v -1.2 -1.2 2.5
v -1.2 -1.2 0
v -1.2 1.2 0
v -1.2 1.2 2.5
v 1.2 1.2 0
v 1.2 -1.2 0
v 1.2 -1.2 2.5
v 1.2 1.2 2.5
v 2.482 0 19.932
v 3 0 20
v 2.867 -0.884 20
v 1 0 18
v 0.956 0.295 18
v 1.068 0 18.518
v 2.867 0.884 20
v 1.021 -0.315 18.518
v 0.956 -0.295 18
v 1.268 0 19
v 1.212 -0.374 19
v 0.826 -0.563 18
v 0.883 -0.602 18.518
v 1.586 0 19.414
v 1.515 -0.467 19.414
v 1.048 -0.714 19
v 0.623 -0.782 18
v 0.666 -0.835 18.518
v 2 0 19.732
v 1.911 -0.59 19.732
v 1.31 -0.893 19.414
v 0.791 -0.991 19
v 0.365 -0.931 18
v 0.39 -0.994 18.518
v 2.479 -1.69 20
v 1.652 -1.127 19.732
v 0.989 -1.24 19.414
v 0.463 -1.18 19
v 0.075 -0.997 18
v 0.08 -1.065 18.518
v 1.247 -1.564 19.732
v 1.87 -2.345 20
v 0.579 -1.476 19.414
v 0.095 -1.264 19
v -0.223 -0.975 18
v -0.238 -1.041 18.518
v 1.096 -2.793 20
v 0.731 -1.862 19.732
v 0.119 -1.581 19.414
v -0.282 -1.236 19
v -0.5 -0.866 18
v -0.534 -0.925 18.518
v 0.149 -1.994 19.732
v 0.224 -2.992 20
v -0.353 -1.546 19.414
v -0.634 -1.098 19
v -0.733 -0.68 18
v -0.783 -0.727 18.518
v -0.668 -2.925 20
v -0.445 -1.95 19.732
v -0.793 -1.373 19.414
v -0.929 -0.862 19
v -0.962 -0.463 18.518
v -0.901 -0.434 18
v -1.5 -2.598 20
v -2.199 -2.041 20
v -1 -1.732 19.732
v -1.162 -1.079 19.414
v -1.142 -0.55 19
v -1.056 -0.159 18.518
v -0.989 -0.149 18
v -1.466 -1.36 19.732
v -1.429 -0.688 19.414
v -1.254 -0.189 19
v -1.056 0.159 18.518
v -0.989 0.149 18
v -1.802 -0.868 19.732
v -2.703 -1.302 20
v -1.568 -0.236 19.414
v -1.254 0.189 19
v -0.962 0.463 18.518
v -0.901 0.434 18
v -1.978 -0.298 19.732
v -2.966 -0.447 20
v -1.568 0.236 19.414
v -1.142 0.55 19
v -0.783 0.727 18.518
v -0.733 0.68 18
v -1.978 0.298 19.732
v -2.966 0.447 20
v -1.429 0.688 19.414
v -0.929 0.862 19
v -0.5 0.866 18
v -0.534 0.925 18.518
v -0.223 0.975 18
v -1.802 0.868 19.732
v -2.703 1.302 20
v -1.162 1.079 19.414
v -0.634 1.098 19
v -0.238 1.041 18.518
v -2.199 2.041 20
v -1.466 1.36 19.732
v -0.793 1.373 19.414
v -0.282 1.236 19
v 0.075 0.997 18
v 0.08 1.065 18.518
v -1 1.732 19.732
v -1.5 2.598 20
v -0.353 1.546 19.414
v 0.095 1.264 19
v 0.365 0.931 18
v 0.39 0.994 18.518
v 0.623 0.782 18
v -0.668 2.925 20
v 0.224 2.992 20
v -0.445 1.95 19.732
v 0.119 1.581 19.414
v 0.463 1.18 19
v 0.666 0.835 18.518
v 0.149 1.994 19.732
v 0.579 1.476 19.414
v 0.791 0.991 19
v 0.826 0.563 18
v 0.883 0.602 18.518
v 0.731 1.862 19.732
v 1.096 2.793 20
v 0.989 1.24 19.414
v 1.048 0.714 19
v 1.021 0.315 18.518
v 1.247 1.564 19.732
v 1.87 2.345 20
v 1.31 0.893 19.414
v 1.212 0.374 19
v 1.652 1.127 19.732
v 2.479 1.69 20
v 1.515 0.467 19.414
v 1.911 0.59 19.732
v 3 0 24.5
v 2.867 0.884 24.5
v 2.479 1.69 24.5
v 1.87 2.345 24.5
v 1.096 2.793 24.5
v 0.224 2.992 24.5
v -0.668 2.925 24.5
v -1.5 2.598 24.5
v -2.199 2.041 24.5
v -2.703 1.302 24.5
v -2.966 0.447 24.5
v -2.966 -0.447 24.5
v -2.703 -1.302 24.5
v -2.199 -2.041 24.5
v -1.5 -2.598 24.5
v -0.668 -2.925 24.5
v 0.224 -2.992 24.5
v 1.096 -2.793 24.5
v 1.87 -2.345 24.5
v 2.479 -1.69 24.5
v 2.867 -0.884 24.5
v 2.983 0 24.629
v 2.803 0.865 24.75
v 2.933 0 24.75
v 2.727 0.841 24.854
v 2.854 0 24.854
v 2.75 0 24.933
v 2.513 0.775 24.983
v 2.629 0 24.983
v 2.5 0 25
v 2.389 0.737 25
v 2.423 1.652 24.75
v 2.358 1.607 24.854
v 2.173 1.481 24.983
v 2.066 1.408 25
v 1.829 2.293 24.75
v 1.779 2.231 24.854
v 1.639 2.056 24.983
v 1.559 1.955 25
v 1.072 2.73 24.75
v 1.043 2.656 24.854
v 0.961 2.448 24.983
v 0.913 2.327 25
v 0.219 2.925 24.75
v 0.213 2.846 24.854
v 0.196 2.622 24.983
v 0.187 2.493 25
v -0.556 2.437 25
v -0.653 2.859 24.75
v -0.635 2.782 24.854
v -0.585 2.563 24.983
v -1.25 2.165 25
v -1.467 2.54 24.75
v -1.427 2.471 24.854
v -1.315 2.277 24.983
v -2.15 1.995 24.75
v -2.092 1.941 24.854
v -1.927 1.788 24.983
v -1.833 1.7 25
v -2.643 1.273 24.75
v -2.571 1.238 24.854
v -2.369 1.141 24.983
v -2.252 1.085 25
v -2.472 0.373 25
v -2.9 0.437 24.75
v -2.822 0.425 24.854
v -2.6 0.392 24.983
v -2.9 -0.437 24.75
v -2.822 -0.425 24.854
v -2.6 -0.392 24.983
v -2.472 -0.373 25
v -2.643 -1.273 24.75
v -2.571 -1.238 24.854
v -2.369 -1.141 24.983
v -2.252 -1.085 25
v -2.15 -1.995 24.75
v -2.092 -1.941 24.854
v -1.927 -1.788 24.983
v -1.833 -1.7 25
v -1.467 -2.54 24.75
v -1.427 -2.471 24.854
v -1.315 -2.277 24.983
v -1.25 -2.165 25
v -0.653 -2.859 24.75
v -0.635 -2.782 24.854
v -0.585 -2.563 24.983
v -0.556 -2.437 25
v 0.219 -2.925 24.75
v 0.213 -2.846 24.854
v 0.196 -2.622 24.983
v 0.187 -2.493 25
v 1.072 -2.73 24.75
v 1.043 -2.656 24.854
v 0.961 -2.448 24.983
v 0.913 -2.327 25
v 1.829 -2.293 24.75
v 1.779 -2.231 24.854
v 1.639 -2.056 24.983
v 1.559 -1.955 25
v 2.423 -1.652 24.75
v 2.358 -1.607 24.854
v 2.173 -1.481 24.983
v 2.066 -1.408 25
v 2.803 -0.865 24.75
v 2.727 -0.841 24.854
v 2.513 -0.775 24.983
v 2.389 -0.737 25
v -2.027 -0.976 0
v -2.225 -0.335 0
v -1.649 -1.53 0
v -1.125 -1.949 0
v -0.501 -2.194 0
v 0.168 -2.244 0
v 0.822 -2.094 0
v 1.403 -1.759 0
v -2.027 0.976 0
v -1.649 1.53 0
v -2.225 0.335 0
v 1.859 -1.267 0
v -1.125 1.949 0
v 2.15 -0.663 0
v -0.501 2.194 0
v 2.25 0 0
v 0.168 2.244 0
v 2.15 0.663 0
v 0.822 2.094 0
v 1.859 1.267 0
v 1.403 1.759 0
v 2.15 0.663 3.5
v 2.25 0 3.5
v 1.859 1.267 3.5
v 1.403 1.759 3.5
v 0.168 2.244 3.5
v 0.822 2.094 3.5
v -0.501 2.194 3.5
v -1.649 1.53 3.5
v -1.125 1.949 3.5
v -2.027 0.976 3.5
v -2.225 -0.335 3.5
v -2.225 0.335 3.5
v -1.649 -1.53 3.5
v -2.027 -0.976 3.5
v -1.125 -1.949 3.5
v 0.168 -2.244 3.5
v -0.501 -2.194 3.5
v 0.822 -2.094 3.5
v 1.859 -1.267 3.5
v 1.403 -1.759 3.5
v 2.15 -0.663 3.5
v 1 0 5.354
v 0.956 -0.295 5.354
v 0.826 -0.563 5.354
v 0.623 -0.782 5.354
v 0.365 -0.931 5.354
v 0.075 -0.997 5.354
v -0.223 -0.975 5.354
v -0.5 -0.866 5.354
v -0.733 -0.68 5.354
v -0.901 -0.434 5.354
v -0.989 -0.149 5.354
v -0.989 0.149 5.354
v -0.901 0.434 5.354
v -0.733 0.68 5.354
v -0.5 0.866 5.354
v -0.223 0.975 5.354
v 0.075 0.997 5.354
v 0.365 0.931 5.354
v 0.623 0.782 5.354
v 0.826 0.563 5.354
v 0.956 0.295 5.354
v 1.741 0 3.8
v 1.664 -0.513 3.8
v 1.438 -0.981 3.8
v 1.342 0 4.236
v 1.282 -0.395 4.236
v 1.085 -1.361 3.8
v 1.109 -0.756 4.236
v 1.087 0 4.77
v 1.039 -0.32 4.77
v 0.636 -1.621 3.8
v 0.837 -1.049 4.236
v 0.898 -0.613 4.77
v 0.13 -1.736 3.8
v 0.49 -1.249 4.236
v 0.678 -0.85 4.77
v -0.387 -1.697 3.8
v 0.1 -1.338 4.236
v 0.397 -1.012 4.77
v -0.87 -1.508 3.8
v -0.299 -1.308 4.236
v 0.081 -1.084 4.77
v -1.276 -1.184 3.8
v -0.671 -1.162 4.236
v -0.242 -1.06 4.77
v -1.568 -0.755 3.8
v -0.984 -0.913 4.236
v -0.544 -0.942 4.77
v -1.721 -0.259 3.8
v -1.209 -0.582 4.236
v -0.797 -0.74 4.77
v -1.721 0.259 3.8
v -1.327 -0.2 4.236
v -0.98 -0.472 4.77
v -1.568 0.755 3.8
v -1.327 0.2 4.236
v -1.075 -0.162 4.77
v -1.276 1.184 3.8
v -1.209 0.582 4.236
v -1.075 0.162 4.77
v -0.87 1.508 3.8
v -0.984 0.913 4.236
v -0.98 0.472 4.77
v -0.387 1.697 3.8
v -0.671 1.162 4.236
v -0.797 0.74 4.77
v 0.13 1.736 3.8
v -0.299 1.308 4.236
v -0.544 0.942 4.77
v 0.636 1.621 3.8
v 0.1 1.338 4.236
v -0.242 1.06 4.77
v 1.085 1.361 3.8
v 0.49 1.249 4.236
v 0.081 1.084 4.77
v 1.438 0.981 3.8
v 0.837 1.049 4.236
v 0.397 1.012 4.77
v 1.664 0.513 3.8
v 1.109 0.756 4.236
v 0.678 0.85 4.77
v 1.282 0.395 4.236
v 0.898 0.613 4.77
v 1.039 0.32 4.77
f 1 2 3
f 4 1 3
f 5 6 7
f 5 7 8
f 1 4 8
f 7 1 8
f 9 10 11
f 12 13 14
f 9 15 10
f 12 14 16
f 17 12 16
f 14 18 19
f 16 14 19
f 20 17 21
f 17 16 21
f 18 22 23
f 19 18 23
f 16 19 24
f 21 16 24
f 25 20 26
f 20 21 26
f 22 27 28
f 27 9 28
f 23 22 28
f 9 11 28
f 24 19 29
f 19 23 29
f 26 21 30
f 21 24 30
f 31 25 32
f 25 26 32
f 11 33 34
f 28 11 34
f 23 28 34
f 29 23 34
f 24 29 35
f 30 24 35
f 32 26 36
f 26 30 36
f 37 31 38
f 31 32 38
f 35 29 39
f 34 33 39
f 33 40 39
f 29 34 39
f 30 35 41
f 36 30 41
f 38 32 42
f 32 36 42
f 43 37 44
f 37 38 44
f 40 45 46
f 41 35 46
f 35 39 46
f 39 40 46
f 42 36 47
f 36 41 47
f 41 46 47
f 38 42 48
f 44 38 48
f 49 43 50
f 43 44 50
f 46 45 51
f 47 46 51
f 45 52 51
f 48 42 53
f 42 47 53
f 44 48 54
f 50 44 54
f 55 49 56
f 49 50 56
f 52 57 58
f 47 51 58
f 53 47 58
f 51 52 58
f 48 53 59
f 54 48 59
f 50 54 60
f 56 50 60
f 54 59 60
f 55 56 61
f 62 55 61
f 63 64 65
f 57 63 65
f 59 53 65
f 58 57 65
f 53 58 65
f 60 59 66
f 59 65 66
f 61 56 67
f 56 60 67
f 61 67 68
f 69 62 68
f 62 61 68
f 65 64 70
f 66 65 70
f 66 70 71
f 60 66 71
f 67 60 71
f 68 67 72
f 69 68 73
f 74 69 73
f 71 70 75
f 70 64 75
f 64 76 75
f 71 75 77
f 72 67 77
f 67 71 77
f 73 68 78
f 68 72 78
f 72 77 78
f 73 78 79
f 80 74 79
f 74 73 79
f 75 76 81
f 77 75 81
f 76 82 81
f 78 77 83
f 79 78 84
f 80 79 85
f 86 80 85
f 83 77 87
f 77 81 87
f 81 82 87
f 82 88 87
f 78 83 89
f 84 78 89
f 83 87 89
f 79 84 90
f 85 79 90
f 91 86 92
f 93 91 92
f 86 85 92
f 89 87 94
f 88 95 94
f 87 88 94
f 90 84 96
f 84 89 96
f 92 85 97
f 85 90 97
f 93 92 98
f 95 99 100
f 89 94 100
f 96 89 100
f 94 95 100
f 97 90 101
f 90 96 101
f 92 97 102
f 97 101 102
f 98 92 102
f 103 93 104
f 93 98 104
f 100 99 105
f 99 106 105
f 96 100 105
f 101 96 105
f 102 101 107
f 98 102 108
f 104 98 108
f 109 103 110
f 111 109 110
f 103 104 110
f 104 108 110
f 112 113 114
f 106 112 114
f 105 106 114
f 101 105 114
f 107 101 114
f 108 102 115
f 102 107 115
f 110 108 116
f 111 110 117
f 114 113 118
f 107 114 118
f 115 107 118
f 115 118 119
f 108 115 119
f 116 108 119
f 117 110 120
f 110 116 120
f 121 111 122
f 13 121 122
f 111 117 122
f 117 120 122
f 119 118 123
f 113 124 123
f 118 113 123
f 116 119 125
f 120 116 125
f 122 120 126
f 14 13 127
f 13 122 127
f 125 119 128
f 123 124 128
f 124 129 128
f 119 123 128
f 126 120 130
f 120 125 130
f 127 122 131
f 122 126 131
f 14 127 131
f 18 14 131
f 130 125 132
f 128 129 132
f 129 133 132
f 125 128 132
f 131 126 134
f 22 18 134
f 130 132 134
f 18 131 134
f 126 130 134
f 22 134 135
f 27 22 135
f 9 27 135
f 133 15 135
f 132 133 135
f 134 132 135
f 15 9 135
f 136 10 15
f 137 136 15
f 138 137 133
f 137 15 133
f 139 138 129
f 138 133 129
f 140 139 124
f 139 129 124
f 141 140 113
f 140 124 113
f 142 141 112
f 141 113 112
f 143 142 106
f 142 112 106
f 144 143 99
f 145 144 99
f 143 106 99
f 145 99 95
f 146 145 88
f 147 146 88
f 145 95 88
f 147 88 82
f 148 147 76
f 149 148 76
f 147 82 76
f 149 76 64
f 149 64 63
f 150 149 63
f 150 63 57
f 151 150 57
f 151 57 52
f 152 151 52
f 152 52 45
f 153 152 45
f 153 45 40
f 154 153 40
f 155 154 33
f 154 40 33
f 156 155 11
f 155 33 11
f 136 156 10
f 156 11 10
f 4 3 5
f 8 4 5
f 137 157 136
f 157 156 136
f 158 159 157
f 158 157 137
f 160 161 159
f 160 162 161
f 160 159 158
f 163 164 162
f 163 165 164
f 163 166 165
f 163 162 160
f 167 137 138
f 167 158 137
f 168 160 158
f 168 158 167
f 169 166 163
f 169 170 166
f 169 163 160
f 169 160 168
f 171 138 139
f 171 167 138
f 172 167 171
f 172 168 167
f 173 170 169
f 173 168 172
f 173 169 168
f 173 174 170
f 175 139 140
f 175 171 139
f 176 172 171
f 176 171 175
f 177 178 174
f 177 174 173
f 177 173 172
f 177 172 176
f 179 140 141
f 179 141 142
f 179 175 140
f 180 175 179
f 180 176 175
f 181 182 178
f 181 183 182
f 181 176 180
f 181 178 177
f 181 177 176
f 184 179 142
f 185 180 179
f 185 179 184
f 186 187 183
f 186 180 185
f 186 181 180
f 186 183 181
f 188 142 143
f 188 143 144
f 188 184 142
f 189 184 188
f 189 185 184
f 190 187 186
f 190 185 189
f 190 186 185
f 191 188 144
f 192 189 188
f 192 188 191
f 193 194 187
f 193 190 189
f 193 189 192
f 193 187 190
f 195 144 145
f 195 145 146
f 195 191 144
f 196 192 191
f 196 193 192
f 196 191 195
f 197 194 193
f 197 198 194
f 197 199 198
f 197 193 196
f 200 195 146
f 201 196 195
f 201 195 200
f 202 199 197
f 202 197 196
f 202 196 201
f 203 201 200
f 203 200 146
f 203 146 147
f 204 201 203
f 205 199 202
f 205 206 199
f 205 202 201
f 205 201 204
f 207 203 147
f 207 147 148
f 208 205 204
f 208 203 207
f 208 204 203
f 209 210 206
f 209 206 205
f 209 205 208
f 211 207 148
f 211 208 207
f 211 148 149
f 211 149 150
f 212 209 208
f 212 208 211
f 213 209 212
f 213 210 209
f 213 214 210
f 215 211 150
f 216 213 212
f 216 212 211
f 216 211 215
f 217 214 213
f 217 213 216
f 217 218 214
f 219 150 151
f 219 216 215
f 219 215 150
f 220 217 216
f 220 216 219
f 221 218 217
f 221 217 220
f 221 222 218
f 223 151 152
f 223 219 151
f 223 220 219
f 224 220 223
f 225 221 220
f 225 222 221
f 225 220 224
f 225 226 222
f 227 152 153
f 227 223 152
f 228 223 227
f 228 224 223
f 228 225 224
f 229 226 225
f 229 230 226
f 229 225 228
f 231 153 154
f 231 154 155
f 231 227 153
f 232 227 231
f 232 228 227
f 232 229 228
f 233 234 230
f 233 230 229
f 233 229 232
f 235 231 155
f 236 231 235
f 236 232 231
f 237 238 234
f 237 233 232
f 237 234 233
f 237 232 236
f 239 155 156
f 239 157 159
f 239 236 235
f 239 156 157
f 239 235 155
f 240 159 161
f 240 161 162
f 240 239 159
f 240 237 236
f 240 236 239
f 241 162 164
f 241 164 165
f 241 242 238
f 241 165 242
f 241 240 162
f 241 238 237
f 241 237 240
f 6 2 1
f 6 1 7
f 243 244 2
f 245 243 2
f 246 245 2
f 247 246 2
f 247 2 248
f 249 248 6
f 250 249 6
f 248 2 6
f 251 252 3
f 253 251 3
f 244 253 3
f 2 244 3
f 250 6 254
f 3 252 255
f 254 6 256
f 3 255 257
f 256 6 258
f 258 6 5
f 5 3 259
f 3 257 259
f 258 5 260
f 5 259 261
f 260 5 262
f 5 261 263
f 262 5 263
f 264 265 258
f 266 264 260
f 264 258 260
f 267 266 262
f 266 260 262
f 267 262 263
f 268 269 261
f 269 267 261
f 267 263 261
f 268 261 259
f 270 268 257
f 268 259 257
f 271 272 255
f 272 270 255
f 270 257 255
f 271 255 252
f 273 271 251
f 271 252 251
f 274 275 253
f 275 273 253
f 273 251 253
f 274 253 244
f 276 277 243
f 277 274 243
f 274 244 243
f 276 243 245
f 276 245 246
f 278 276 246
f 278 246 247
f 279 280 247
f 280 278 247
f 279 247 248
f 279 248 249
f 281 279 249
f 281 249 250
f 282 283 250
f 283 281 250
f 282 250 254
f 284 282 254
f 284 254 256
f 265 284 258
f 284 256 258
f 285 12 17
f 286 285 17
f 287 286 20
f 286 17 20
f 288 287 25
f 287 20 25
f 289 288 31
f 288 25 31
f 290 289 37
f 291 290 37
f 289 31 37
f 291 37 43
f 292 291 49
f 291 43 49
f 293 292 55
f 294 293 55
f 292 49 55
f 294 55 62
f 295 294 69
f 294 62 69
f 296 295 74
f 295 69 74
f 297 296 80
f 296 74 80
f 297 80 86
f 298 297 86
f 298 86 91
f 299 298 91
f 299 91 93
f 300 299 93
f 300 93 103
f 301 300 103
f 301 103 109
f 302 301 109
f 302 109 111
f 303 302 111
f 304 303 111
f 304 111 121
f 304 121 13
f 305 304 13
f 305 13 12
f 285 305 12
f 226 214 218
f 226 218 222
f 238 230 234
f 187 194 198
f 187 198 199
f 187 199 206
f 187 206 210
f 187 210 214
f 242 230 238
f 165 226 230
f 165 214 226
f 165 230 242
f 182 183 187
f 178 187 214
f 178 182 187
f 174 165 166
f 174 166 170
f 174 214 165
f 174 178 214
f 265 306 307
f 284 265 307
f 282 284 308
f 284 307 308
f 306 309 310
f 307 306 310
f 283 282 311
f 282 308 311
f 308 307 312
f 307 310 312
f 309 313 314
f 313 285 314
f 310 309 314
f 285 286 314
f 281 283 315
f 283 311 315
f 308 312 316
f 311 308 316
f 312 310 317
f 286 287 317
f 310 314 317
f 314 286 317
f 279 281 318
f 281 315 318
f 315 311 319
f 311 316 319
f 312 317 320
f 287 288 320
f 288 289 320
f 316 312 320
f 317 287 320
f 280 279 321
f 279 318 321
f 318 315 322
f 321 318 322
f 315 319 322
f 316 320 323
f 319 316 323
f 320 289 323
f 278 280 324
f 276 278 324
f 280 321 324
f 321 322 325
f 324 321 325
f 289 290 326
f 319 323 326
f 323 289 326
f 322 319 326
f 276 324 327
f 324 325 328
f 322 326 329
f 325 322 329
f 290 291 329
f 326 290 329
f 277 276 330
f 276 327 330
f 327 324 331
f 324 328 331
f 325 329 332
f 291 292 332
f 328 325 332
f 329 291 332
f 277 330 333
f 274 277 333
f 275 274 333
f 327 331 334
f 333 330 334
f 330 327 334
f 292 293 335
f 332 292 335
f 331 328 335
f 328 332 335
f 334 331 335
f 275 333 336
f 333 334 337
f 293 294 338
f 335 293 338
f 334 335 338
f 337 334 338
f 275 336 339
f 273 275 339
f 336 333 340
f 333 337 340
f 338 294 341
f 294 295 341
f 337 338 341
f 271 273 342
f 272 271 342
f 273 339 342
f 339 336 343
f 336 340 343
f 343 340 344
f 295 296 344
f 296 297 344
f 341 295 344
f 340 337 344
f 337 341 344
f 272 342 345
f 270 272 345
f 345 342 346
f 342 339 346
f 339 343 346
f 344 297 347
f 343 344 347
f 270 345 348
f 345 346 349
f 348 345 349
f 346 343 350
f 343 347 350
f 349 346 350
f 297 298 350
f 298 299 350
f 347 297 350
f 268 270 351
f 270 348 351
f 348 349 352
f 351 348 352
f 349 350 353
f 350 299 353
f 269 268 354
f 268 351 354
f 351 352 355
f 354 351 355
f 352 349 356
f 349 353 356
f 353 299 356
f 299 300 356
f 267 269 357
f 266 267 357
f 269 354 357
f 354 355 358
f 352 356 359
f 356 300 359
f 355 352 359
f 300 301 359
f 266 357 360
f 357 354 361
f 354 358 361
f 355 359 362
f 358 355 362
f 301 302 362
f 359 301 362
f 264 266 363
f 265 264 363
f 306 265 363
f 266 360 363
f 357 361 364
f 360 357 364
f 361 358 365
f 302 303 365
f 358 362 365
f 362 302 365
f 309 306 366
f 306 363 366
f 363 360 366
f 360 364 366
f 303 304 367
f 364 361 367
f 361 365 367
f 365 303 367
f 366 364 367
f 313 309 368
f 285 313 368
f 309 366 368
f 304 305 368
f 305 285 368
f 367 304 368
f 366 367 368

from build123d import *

# Parameters (mm, degrees)
SKETCH_1_R          = 2.25
EXTRUDE_2_DEPTH     = 20
SKETCH_7_W          = 2.4
SKETCH_7_H          = 2.4
CUT_EXTRUDE_3_DEPTH = 2.5
SKETCH_9_R          = 3
EXTRUDE_4_DEPTH     = 5
CUT_EXTRUDE_START   = -20
SKETCH_12_OUTSIDE_W = 13.28
SKETCH_12_OUTSIDE_H = 13.28
SKETCH_12_OUTSIDE_R = 1
CUT_EXTRUDE_4_DEPTH = 16.5
FILLET_2_R          = 2
FILLET_3_R          = 0.5


with BuildPart() as part:
    # 草图1 → 凸台-拉伸2 (new body)
    with BuildSketch(Plane.XY):
        Circle(SKETCH_1_R)
    extrude(amount=EXTRUDE_2_DEPTH)

    # 草图7 → 切除-拉伸3 (cut)
    with BuildSketch(Plane.XY):
        Rectangle(SKETCH_7_W, SKETCH_7_H)
    extrude(amount=CUT_EXTRUDE_3_DEPTH, mode=Mode.SUBTRACT)

    # 草图9 → 凸台-拉伸4 (add)
    with BuildSketch(Plane.XY.offset(20)):
        Circle(SKETCH_9_R)
    extrude(amount=EXTRUDE_4_DEPTH)

    # 草图12 outside → 切除-拉伸4 (cut)
    with BuildSketch(Plane(origin=(0, 0, 0), x_dir=(-1, 0, 0), z_dir=(0, 0, -1)).offset(CUT_EXTRUDE_START)):
        Rectangle(SKETCH_12_OUTSIDE_W, SKETCH_12_OUTSIDE_H)
        with Locations(Location((0, 0, 0), (0, 0, 180))):
            Circle(SKETCH_12_OUTSIDE_R, mode=Mode.SUBTRACT)
    extrude(amount=CUT_EXTRUDE_4_DEPTH, mode=Mode.SUBTRACT)

    # 圆角2
    # the kernel refuses this fillet: 2 mm, written as the material it adds along each edge
    with BuildSketch(Plane(origin=(0, 0, 3.5), x_dir=(1, 0, 0), z_dir=(0, 1, 0))) as fillet_2_piece_1:
        with BuildLine():
            CenterArc((3, -1.854049622), FILLET_2_R, 112.024312837, 67.975687163)
            Line((2.25, 0), (2.235, 0.037080992))
            ThreePointArc((2.235, 0.037080992), (1.625, 0.04), (1, 0.04))
            Line((1, 0.04), (0.96, 0))
            Line((0.96, 0), (0.96, -1.854049622))
            Line((0.96, -1.854049622), (1, -1.854049622))
        make_face()
    revolve(axis=Axis((0, 0, 3.5), (0, 0, -1)))
    with BuildSketch(Plane(origin=(0, 0, 20), x_dir=(1, 0, 0), z_dir=(0, 1, 0))) as fillet_2_piece_2:
        with BuildLine():
            CenterArc((1 + FILLET_2_R, FILLET_2_R), FILLET_2_R, 180, 90)
            Line((1, FILLET_2_R), (1 - FILLET_2_R * 0.02, FILLET_2_R))
            Line((1 - FILLET_2_R * 0.02, FILLET_2_R), (1 - FILLET_2_R * 0.02, -FILLET_2_R * 0.02))
            Line((1 - FILLET_2_R * 0.02, -FILLET_2_R * 0.02), (1 + FILLET_2_R, -FILLET_2_R * 0.02))
            Line((1 + FILLET_2_R, -FILLET_2_R * 0.02), (1 + FILLET_2_R, 0))
        make_face()
    revolve(axis=Axis((0, 0, 20), (0, 0, -1)))

    # 圆角3
    fillet_3_edges = [part.edges().sort_by_distance(p)[0] for p in [
        (-3, 0, 25),
    ]]
    fillet(fillet_3_edges, radius=FILLET_3_R)


solid = part.part
